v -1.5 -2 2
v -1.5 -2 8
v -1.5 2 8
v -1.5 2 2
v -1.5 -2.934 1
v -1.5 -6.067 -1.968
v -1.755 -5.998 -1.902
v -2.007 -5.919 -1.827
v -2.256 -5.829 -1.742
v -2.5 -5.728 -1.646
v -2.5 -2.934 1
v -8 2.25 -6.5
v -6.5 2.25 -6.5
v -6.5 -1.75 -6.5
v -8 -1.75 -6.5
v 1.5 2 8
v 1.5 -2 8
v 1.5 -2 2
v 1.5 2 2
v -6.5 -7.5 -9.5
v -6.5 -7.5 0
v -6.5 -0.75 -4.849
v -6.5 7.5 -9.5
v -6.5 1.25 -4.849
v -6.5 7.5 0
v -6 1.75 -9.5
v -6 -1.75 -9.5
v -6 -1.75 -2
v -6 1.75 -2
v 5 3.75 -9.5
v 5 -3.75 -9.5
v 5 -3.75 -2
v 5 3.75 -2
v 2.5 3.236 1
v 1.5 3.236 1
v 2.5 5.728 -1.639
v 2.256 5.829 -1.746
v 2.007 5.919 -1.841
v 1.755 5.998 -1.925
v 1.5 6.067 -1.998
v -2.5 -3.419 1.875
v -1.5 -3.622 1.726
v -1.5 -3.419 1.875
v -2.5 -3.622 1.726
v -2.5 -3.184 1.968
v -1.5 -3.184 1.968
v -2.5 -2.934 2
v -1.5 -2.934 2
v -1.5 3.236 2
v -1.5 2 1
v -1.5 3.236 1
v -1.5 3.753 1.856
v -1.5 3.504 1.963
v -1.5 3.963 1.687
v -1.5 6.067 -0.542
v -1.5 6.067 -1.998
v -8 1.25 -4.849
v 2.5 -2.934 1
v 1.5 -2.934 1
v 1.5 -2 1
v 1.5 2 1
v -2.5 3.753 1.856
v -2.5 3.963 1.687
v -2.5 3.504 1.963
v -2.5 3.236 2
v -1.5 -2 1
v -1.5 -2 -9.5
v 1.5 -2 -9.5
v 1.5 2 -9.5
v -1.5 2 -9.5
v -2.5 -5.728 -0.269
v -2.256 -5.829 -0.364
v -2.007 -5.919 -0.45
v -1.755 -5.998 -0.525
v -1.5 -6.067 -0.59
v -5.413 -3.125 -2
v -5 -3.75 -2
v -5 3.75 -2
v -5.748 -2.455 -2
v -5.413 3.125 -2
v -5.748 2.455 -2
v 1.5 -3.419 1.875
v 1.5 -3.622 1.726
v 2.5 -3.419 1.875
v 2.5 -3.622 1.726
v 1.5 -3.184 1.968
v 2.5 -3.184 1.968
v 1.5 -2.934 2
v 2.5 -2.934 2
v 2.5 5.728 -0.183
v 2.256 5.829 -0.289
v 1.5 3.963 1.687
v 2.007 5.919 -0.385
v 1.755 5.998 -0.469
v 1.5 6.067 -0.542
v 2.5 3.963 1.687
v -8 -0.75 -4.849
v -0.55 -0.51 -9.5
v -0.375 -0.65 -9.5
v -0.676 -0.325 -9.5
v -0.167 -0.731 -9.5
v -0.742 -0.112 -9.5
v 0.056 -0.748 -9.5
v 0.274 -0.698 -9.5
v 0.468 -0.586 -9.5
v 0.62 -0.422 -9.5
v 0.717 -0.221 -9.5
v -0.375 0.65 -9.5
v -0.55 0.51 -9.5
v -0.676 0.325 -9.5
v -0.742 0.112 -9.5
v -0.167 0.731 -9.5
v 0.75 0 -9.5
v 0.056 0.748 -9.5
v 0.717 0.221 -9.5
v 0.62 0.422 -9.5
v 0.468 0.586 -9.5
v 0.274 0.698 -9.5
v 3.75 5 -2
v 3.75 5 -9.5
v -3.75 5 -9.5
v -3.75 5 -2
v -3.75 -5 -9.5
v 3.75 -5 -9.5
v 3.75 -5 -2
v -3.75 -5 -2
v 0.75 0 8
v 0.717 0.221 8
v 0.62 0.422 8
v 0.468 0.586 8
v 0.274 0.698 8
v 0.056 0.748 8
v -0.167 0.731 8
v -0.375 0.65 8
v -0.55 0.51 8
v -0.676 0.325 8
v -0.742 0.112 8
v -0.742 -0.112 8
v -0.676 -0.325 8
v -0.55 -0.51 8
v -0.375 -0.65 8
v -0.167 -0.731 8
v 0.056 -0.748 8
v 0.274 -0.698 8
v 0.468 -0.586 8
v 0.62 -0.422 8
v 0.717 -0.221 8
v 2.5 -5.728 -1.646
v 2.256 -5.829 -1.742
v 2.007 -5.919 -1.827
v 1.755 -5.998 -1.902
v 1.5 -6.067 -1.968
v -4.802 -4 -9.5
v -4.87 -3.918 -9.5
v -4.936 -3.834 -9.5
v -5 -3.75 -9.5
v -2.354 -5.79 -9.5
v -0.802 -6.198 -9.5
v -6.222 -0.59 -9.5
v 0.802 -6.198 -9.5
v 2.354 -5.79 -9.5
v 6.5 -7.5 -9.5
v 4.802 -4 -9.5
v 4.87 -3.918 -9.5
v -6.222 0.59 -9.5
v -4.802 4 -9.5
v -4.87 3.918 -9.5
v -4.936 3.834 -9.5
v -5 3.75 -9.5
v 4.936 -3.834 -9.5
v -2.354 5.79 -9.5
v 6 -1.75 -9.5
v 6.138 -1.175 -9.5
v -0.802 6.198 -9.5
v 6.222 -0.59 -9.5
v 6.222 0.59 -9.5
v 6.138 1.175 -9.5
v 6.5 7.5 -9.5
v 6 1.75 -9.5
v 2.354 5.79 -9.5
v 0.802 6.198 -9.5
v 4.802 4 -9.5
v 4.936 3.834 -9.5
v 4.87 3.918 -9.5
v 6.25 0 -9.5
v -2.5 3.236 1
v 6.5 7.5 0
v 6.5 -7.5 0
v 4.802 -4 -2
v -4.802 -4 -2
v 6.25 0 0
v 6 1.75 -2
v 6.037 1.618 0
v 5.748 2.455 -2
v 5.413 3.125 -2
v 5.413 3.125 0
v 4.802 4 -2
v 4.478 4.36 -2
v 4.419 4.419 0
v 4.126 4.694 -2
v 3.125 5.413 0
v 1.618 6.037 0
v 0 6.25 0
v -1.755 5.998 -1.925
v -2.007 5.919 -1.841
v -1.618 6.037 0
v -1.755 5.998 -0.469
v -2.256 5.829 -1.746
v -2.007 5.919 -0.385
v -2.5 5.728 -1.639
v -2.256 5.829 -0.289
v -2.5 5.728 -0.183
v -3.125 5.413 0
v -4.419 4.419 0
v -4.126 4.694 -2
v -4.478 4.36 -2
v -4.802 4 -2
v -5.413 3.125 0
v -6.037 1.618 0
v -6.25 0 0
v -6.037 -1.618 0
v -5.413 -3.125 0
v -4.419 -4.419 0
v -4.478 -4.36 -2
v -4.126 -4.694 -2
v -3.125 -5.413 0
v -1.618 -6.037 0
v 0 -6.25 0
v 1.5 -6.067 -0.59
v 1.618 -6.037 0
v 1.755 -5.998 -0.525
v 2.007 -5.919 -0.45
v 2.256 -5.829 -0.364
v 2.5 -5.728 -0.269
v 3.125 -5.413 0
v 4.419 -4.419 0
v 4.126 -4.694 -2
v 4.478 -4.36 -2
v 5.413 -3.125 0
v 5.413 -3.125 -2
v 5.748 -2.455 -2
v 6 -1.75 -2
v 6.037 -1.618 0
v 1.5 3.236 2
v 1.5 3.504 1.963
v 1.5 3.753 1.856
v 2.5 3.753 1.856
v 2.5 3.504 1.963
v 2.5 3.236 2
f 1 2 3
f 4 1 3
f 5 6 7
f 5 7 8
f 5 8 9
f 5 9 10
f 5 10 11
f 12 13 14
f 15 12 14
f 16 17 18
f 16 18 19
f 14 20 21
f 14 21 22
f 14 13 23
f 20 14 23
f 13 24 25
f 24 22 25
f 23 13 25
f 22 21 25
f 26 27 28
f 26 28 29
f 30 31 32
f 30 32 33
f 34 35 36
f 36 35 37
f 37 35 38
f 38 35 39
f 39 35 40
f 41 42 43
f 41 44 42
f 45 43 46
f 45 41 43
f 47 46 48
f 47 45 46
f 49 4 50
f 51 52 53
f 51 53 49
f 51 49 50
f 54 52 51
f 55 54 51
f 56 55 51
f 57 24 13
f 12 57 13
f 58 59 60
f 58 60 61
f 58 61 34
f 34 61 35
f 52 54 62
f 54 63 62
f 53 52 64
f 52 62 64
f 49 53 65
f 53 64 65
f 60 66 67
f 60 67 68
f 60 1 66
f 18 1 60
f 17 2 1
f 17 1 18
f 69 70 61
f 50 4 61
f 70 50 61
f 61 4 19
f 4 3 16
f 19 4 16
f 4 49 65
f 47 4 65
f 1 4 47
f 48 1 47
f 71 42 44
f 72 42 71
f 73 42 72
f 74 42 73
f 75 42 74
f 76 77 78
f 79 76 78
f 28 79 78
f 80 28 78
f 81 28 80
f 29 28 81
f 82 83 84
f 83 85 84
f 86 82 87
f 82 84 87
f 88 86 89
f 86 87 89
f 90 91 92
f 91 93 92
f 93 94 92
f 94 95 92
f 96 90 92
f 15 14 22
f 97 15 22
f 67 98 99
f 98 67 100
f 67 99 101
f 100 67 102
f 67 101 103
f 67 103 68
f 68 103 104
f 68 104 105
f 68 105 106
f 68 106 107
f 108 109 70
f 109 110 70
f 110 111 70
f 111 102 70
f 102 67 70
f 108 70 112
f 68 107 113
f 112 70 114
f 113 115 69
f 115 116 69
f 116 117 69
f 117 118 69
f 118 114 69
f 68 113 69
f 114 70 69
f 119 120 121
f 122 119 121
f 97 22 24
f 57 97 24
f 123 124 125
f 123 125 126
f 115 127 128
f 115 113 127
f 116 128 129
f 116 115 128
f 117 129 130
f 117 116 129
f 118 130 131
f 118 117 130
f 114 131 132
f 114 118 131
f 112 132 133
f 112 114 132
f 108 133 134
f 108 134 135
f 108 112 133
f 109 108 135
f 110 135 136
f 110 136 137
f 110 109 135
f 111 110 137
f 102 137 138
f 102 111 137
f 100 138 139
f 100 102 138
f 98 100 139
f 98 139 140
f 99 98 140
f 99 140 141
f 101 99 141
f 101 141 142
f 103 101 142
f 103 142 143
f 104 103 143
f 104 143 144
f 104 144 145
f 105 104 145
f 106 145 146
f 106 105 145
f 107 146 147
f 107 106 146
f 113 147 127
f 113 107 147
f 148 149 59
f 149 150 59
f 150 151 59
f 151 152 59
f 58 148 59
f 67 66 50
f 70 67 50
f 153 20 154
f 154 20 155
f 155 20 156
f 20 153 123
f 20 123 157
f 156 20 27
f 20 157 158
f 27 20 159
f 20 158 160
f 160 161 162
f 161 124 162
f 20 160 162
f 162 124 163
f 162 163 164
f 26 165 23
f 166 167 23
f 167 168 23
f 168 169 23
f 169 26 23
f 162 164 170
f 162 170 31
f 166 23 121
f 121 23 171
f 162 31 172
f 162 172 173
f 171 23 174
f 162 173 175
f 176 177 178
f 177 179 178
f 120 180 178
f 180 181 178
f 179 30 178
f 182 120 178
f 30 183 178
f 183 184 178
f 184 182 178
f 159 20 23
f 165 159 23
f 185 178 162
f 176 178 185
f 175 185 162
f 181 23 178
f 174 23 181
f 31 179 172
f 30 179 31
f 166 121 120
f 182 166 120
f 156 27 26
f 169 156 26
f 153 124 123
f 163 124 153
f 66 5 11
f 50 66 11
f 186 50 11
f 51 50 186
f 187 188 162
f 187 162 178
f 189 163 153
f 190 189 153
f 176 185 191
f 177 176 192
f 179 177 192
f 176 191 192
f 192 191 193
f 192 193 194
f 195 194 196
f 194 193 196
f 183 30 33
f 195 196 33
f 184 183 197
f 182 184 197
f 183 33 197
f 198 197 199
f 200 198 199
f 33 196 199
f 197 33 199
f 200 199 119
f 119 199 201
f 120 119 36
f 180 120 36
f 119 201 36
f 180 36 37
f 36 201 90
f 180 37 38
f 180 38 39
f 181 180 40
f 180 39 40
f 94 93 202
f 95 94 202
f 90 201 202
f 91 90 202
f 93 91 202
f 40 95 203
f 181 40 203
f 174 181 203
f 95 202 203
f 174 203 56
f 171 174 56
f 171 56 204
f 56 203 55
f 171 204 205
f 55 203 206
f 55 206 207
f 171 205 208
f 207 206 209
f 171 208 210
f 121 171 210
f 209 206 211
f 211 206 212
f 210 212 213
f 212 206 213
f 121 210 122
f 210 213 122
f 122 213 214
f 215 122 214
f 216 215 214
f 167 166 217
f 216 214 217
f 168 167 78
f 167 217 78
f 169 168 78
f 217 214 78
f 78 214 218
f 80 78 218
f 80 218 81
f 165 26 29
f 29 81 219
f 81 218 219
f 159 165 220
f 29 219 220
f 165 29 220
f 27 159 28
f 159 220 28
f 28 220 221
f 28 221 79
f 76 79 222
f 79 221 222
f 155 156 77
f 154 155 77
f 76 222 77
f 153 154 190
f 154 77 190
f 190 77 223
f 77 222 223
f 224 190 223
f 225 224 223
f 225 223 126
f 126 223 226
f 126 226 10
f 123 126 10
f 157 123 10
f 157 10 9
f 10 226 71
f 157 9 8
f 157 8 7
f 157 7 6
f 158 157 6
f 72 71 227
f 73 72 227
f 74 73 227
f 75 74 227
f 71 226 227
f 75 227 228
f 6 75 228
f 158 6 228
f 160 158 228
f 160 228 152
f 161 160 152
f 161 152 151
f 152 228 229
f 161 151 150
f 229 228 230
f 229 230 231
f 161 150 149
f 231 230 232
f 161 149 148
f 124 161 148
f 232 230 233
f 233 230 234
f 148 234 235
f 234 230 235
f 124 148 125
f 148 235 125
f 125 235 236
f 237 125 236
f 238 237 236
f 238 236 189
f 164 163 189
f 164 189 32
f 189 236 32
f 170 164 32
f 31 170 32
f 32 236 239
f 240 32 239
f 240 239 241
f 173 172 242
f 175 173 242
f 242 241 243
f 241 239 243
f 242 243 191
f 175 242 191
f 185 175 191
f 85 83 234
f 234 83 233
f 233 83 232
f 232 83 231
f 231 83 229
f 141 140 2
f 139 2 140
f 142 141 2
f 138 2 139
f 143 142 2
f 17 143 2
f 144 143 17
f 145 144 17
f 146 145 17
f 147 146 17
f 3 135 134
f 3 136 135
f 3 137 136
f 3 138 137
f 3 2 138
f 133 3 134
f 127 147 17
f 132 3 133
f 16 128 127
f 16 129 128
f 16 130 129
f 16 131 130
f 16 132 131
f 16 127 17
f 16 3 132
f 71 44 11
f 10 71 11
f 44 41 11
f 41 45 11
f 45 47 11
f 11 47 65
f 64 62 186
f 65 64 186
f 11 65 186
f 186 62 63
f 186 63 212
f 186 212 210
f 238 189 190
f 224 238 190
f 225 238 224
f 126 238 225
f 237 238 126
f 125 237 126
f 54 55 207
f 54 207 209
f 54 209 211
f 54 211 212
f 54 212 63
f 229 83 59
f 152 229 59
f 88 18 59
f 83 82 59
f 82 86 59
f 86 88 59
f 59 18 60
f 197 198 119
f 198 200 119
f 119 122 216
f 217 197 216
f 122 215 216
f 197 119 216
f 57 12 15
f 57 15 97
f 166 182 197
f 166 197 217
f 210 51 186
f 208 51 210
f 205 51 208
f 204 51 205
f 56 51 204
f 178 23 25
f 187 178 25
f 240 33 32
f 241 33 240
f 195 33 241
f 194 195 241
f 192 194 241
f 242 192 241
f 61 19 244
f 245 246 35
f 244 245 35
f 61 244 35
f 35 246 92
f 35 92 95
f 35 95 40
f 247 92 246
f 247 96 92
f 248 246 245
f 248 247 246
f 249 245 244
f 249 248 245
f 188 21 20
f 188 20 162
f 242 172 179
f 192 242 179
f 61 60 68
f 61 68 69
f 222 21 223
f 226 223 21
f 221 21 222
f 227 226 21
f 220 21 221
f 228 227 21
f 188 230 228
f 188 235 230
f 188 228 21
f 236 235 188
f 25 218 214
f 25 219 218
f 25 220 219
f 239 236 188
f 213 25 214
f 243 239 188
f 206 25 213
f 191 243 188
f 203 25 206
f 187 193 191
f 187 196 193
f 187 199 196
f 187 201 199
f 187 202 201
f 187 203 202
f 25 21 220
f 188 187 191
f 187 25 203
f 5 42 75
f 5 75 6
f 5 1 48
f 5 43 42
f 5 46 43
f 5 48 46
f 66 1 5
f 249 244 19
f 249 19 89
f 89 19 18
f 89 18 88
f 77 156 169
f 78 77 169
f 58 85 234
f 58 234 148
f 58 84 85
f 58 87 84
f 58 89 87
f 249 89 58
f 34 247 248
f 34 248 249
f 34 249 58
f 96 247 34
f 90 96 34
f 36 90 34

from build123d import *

# Parameters (mm, degrees)
ESBO_O1_W                     = 13
ESBO_O1_H                     = 15
RESSALTO_EXTRUS_O1_DEPTH      = 9.5
ESBO_O3_R                     = 6.25
CORTE_EXTRUS_O1_DEPTH         = 10.5
ESBO_O2_W                     = 3
ESBO_O2_H                     = 4
ESBO_O2_R                     = 0.75
RESSALTO_EXTRUS_O2_DEPTH      = 8
RESSALTO_EXTRUS_O2_DEPTH_BACK = 9.5
RESSALTO_EXTRUS_O3_DEPTH      = 1.5
ESBO_O5_W                     = 12
ESBO_O5_H                     = 10
ESBO_O5_W_2                   = 10
ESBO_O5_H_2                   = 8
RESSALTO_EXTRUS_O4_DEPTH      = 7.5
RESSALTO_EXTRUS_O5_DEPTH      = 1
FILETE1_R                     = 1


with BuildPart() as part:
    # Esboço1 → Ressalto-extrusão1 (new body)
    with BuildSketch(Plane.XY):
        Rectangle(ESBO_O1_W, ESBO_O1_H)
    extrude(amount=-RESSALTO_EXTRUS_O1_DEPTH)

    # Esboço3 → Corte-extrusão1 (cut, through all)
    with BuildSketch(Plane.XY):
        Circle(ESBO_O3_R)
    extrude(amount=-CORTE_EXTRUS_O1_DEPTH, mode=Mode.SUBTRACT)

    # Esboço4 → Ressalto-extrusão3 (add)
    with BuildSketch(Plane.ZY.offset(6.5)):
        Polygon((-6.5, 2.25), (-6.5, -1.75), (-4.849272887, -0.75), (-4.849272887, 1.25), align=None)
    extrude(amount=RESSALTO_EXTRUS_O3_DEPTH)

    # Esboço5 → Ressalto-extrusão4 (add)
    with BuildSketch(Plane(origin=(0, 0, -9.5), x_dir=(-1, 0, 0), z_dir=(0, 0, -1))):
        Rectangle(ESBO_O5_W, ESBO_O5_H)
        Rectangle(ESBO_O5_W_2, ESBO_O5_H_2, mode=Mode.SUBTRACT)
    extrude(amount=-RESSALTO_EXTRUS_O4_DEPTH)



with BuildPart() as body_2:
    # Esboço2 → Ressalto-extrusão2 (new body, two sides)
    with BuildSketch(Plane.XY) as ressalto_extrus_o2_sk:
        Rectangle(ESBO_O2_W, ESBO_O2_H)
        Circle(ESBO_O2_R, mode=Mode.SUBTRACT)
    extrude(amount=RESSALTO_EXTRUS_O2_DEPTH)
    extrude(ressalto_extrus_o2_sk.sketch, amount=-RESSALTO_EXTRUS_O2_DEPTH_BACK)


with BuildPart() as part_1:
    add(part.part)

    add(body_2.part)  # Ressalto-extrusão5 merges body 2
    # Esboço6 → Ressalto-extrusão5 (add)
    with BuildSketch(Plane.ZY.offset(1.5)):
        Polygon((-1, 7.5), (-1, 6.5), (2, 3.667217521), (2, -3.332782479), (-1, -6.5), (-1, -7.5), (-2, -7.5), (-2, -6.101577834), (1, -2.934360312), (1, 3.236113484), (-2, 6.068895963), (-2, 7.5), align=None)
    ressalto_extrus_o5 = extrude(amount=RESSALTO_EXTRUS_O5_DEPTH)

    # Espelhar1: Ressalto-extrusão5 across plane
    add(ressalto_extrus_o5.mirror(Plane(origin=(0, 0, 0), x_dir=(0, 0, 1), z_dir=(1, 0, 0))))

    # Filete1
    filete1_edges = [part_1.edges().sort_by_distance(p)[0] for p in [
        (2, -3.332782479, 2),
        (2, 3.667217521, 2),
        (-2, -3.332782479, 2),
        (-2, 3.667217521, 2),
    ]]
    fillet(filete1_edges, radius=FILETE1_R)


solid = part_1.part
